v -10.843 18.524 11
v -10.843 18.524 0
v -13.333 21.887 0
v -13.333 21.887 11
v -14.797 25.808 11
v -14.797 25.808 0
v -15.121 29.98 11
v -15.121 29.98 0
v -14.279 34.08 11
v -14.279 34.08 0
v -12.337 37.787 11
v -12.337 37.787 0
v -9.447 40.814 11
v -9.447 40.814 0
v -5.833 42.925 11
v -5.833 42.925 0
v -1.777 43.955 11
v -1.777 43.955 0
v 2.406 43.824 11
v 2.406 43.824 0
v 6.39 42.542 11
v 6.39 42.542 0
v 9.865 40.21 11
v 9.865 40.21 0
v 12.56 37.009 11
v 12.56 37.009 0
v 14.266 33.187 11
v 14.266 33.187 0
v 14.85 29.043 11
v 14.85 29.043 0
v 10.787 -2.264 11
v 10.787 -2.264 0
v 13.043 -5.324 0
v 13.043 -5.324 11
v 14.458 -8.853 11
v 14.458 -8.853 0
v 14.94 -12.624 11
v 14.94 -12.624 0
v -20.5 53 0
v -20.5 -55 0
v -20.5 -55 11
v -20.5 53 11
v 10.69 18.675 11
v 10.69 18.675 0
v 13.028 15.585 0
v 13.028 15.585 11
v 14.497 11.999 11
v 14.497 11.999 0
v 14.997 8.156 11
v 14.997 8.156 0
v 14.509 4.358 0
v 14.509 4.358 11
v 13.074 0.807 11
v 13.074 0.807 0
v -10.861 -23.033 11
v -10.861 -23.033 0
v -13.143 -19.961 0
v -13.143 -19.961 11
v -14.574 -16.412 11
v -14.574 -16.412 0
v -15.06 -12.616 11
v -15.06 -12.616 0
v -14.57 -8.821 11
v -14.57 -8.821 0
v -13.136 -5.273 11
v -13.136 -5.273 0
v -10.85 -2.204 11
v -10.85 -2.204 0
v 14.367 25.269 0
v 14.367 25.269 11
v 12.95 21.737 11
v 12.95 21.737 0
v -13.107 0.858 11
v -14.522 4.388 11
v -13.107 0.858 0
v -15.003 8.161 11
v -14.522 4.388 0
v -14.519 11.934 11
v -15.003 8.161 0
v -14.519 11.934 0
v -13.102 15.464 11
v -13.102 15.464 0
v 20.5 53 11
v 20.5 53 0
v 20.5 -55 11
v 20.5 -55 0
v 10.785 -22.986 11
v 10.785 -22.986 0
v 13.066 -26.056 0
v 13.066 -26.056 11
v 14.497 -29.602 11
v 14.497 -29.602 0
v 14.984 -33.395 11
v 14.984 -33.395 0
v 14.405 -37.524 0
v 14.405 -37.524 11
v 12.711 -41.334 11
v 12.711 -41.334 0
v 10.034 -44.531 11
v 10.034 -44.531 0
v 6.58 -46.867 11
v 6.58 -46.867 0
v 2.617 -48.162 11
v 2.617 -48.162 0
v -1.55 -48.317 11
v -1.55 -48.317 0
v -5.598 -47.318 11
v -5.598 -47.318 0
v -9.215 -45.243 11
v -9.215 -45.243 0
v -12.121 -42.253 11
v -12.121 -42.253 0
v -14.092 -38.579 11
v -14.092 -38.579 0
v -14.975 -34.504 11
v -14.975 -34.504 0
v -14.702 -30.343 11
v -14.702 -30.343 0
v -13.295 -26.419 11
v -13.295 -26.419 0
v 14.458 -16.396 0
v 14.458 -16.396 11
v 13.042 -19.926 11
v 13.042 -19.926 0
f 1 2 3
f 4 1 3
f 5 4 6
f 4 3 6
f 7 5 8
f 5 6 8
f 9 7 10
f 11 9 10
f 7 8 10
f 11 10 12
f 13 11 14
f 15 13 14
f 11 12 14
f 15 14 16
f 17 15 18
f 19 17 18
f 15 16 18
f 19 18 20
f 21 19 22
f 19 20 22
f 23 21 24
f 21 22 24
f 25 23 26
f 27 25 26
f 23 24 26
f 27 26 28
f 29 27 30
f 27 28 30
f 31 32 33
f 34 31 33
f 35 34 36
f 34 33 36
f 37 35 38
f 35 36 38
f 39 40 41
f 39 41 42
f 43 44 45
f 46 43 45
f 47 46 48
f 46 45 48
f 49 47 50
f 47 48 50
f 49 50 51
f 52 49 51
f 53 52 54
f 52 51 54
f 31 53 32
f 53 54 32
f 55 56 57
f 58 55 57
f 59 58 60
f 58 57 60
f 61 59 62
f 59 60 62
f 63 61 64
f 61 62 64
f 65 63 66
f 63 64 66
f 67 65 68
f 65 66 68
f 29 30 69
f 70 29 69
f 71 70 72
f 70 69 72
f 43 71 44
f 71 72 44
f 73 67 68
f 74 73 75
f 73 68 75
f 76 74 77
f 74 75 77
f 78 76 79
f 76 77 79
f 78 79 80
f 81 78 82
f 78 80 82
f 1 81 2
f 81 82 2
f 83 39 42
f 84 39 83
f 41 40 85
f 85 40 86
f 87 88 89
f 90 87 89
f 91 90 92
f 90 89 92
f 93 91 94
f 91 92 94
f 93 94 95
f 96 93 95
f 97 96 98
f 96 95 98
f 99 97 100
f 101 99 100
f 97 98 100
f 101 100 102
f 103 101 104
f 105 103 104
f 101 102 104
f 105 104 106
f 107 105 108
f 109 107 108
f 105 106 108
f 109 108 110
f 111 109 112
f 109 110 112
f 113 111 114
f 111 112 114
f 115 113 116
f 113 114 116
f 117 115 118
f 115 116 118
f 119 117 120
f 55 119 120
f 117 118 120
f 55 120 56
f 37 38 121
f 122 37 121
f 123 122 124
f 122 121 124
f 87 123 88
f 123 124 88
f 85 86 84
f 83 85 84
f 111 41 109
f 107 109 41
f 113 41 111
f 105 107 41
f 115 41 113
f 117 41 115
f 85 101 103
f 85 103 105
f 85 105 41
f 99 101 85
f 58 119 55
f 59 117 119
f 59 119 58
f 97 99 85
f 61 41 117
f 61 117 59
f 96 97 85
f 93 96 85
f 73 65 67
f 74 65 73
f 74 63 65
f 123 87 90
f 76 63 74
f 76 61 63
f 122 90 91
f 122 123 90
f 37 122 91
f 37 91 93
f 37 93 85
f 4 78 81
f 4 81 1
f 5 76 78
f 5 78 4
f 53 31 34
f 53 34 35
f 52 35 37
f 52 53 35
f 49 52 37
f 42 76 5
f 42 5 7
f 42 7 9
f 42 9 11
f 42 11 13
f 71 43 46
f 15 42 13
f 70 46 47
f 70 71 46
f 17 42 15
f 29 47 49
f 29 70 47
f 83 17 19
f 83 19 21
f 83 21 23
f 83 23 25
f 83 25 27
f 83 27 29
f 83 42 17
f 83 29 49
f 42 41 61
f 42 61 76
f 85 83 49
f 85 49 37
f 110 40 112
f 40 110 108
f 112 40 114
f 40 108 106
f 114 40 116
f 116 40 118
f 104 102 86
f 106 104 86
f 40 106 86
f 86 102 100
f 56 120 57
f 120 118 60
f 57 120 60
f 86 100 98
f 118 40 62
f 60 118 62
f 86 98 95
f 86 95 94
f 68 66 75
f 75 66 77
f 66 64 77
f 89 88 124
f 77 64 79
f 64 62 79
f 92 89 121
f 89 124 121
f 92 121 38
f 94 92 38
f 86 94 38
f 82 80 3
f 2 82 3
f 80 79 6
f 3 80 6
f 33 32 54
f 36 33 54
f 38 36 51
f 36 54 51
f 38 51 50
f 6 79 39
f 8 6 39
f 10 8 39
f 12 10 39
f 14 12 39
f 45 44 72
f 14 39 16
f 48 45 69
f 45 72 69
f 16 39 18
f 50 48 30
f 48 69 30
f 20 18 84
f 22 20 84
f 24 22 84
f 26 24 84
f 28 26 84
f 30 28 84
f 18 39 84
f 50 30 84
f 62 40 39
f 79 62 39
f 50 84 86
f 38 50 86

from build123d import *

# Parameters (mm, degrees)
F0_W     = 41
F0_H     = 108
F1_DEPTH = 11


with BuildPart() as f1:
    # F0 (on Top) → F1 (new body)
    with BuildSketch(Plane.XY):
        with BuildLine():
            ThreePointArc((5.706968, -5.714822), (7.712615, -8.087528), (8.791989, -11.000826))
            ThreePointArc((8.791989, -11.000826), (11.232354, -10.554221), (12.600096, -12.624032))
            ThreePointArc((12.600096, -12.624032), (11.232354, -14.693844), (8.791989, -14.247239))
            ThreePointArc((8.791989, -14.247239), (7.713498, -17.159023), (5.709659, -19.530996))
            ThreePointArc((5.709659, -19.530996), (8.425965, -20.996255), (10.784891, -22.986424))
            ThreePointArc((10.784891, -22.986424), (13.862215, -18.206159), (14.939576, -12.624032))
            ThreePointArc((14.939576, -12.624032), (13.862843, -7.043472), (10.787222, -2.264082))
            ThreePointArc((10.787222, -2.264082), (8.425588, -4.252233), (5.706968, -5.714822))
        make_face()
        with BuildLine():
            ThreePointArc((-8.919726, -11.038862), (-7.830592, -8.082615), (-5.789315, -5.682866))
            ThreePointArc((-5.789315, -5.682866), (-8.499762, -4.205185), (-10.850307, -2.203935))
            ThreePointArc((-10.850307, -2.203935), (-15.060422, -12.616237), (-10.861132, -23.032909))
            ThreePointArc((-10.861132, -23.032909), (-8.510775, -21.032627), (-5.800788, -19.555715))
            ThreePointArc((-5.800788, -19.555715), (-7.814796, -17.19237), (-8.905782, -14.285245))
            ThreePointArc((-8.905782, -14.285245), (-12.720827, -12.678409), (-8.919726, -11.038862))
        make_face()
        with BuildLine():
            ThreePointArc((5.603682, 1.265457), (8.381963, -0.225399), (10.787222, -2.264082))
            ThreePointArc((10.787222, -2.264082), (13.905039, 2.536774), (14.997339, 8.156016))
            ThreePointArc((14.997339, 8.156016), (13.878906, 13.839509), (10.690392, 18.675455))
            ThreePointArc((10.690392, 18.675455), (8.324534, 16.666348), (5.595827, 15.187174))
            ThreePointArc((5.595827, 15.187174), (7.57988, 12.907076), (8.697198, 10.09871))
            ThreePointArc((8.697198, 10.09871), (11.379114, 10.5015), (12.850096, 8.223097))
            ThreePointArc((12.850096, 8.223097), (11.379114, 5.944693), (8.697198, 6.347483))
            ThreePointArc((8.697198, 6.347483), (7.582521, 3.543455), (5.603682, 1.265457))
        make_face()
        with BuildLine():
            ThreePointArc((-10.842957, 18.523657), (-15.00266, 8.161334), (-10.850307, -2.203935))
            ThreePointArc((-10.850307, -2.203935), (-8.49497, -0.220064), (-5.784132, 1.241002))
            ThreePointArc((-5.784132, 1.241002), (-7.772737, 3.510479), (-8.899446, 6.309695))
            ThreePointArc((-8.899446, 6.309695), (-13.060362, 8.167454), (-8.915558, 10.060887))
            ThreePointArc((-8.915558, 10.060887), (-7.810312, 12.874025), (-5.83607, 15.162624))
            ThreePointArc((-5.83607, 15.162624), (-8.510157, 16.588935), (-10.842957, 18.523657))
        make_face()
        with Locations((0, -1)):
            Rectangle(F0_W, F0_H)
        with BuildLine():
            ThreePointArc((14.997339, 8.156016), (13.905039, 2.536774), (10.787222, -2.264082))
            ThreePointArc((10.787222, -2.264082), (13.862843, -7.043472), (14.939576, -12.624032))
            ThreePointArc((14.939576, -12.624032), (13.862215, -18.206159), (10.784891, -22.986424))
            ThreePointArc((10.784891, -22.986424), (13.894801, -27.783287), (14.984183, -33.3953))
            ThreePointArc((14.984183, -33.3953), (-5.597944, -47.317938), (-10.861132, -23.032909))
            ThreePointArc((-10.861132, -23.032909), (-15.060422, -12.616237), (-10.850307, -2.203935))
            ThreePointArc((-10.850307, -2.203935), (-15.00266, 8.161334), (-10.842957, 18.523657))
            ThreePointArc((-10.842957, 18.523657), (-5.833397, 42.924664), (14.850096, 29.043097))
            ThreePointArc((14.850096, 29.043097), (13.771383, 23.457599), (10.690392, 18.675455))
            ThreePointArc((10.690392, 18.675455), (13.878906, 13.839509), (14.997339, 8.156016))
        make_face(mode=Mode.SUBTRACT)
    extrude(amount=F1_DEPTH)


solid = f1.part
